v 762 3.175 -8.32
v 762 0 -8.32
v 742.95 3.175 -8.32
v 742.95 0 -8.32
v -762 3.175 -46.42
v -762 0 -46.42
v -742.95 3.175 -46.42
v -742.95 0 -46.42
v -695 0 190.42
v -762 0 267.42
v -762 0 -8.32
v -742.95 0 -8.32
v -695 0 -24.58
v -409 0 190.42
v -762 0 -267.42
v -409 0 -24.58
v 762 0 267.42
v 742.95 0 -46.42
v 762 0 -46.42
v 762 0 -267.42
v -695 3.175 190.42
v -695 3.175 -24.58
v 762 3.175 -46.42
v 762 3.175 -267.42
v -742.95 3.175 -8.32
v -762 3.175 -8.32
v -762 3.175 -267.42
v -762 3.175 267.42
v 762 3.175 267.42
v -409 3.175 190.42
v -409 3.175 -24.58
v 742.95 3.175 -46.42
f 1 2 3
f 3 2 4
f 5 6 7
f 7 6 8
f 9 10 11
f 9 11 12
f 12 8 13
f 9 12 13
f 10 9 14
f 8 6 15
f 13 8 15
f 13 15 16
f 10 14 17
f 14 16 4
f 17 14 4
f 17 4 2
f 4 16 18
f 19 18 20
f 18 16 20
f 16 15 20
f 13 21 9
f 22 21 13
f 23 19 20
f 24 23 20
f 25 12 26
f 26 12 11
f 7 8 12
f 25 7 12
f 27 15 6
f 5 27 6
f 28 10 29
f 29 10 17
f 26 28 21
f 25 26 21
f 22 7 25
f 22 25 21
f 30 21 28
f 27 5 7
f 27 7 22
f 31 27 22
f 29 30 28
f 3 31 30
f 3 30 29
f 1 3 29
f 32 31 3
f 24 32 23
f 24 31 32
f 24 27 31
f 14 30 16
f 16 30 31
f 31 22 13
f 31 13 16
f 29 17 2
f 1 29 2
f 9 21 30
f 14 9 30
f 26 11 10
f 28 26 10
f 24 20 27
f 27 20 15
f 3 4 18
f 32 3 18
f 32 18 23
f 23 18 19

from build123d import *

# Parameters (mm, degrees)
BOSS_EXTRUDE1_DEPTH = 3.175
CUT_EXTRUDE1_REACH  = 809.569
SKETCH2_W           = 286
SKETCH2_H           = 215


with BuildPart() as part:
    # Sketch1 → Boss-Extrude1 (new body)
    with BuildSketch(Plane(origin=(0, 0, 0), x_dir=(1, 0, 0), z_dir=(0, 1, 0))):
        Polygon((-762, 46.42), (-742.95, 46.42), (-742.95, 8.32), (-762, 8.32), (-762, -267.42), (762, -267.42), (762, 8.32), (742.95, 8.32), (742.95, 46.42), (762, 46.42), (762, 267.42), (-762, 267.42), align=None)
    extrude(amount=BOSS_EXTRUDE1_DEPTH)

    # Sketch2 → Cut-Extrude1 (cut, up to next)
    with BuildSketch(Plane(origin=(0, 3.175, 0), x_dir=(1, 0, 0), z_dir=(0, 1, 0)), mode=Mode.PRIVATE) as cut_extrude1_sk1:
        with Locations((-552, -82.92)):
            Rectangle(SKETCH2_W, SKETCH2_H)
    cut_extrude1_tool1 = extrude(cut_extrude1_sk1.sketch, amount=-CUT_EXTRUDE1_REACH, mode=Mode.PRIVATE) & part.part
    add(cut_extrude1_tool1.solids().sort_by_distance((-552, 3.175, 82.92))[0], mode=Mode.SUBTRACT)


solid = part.part
